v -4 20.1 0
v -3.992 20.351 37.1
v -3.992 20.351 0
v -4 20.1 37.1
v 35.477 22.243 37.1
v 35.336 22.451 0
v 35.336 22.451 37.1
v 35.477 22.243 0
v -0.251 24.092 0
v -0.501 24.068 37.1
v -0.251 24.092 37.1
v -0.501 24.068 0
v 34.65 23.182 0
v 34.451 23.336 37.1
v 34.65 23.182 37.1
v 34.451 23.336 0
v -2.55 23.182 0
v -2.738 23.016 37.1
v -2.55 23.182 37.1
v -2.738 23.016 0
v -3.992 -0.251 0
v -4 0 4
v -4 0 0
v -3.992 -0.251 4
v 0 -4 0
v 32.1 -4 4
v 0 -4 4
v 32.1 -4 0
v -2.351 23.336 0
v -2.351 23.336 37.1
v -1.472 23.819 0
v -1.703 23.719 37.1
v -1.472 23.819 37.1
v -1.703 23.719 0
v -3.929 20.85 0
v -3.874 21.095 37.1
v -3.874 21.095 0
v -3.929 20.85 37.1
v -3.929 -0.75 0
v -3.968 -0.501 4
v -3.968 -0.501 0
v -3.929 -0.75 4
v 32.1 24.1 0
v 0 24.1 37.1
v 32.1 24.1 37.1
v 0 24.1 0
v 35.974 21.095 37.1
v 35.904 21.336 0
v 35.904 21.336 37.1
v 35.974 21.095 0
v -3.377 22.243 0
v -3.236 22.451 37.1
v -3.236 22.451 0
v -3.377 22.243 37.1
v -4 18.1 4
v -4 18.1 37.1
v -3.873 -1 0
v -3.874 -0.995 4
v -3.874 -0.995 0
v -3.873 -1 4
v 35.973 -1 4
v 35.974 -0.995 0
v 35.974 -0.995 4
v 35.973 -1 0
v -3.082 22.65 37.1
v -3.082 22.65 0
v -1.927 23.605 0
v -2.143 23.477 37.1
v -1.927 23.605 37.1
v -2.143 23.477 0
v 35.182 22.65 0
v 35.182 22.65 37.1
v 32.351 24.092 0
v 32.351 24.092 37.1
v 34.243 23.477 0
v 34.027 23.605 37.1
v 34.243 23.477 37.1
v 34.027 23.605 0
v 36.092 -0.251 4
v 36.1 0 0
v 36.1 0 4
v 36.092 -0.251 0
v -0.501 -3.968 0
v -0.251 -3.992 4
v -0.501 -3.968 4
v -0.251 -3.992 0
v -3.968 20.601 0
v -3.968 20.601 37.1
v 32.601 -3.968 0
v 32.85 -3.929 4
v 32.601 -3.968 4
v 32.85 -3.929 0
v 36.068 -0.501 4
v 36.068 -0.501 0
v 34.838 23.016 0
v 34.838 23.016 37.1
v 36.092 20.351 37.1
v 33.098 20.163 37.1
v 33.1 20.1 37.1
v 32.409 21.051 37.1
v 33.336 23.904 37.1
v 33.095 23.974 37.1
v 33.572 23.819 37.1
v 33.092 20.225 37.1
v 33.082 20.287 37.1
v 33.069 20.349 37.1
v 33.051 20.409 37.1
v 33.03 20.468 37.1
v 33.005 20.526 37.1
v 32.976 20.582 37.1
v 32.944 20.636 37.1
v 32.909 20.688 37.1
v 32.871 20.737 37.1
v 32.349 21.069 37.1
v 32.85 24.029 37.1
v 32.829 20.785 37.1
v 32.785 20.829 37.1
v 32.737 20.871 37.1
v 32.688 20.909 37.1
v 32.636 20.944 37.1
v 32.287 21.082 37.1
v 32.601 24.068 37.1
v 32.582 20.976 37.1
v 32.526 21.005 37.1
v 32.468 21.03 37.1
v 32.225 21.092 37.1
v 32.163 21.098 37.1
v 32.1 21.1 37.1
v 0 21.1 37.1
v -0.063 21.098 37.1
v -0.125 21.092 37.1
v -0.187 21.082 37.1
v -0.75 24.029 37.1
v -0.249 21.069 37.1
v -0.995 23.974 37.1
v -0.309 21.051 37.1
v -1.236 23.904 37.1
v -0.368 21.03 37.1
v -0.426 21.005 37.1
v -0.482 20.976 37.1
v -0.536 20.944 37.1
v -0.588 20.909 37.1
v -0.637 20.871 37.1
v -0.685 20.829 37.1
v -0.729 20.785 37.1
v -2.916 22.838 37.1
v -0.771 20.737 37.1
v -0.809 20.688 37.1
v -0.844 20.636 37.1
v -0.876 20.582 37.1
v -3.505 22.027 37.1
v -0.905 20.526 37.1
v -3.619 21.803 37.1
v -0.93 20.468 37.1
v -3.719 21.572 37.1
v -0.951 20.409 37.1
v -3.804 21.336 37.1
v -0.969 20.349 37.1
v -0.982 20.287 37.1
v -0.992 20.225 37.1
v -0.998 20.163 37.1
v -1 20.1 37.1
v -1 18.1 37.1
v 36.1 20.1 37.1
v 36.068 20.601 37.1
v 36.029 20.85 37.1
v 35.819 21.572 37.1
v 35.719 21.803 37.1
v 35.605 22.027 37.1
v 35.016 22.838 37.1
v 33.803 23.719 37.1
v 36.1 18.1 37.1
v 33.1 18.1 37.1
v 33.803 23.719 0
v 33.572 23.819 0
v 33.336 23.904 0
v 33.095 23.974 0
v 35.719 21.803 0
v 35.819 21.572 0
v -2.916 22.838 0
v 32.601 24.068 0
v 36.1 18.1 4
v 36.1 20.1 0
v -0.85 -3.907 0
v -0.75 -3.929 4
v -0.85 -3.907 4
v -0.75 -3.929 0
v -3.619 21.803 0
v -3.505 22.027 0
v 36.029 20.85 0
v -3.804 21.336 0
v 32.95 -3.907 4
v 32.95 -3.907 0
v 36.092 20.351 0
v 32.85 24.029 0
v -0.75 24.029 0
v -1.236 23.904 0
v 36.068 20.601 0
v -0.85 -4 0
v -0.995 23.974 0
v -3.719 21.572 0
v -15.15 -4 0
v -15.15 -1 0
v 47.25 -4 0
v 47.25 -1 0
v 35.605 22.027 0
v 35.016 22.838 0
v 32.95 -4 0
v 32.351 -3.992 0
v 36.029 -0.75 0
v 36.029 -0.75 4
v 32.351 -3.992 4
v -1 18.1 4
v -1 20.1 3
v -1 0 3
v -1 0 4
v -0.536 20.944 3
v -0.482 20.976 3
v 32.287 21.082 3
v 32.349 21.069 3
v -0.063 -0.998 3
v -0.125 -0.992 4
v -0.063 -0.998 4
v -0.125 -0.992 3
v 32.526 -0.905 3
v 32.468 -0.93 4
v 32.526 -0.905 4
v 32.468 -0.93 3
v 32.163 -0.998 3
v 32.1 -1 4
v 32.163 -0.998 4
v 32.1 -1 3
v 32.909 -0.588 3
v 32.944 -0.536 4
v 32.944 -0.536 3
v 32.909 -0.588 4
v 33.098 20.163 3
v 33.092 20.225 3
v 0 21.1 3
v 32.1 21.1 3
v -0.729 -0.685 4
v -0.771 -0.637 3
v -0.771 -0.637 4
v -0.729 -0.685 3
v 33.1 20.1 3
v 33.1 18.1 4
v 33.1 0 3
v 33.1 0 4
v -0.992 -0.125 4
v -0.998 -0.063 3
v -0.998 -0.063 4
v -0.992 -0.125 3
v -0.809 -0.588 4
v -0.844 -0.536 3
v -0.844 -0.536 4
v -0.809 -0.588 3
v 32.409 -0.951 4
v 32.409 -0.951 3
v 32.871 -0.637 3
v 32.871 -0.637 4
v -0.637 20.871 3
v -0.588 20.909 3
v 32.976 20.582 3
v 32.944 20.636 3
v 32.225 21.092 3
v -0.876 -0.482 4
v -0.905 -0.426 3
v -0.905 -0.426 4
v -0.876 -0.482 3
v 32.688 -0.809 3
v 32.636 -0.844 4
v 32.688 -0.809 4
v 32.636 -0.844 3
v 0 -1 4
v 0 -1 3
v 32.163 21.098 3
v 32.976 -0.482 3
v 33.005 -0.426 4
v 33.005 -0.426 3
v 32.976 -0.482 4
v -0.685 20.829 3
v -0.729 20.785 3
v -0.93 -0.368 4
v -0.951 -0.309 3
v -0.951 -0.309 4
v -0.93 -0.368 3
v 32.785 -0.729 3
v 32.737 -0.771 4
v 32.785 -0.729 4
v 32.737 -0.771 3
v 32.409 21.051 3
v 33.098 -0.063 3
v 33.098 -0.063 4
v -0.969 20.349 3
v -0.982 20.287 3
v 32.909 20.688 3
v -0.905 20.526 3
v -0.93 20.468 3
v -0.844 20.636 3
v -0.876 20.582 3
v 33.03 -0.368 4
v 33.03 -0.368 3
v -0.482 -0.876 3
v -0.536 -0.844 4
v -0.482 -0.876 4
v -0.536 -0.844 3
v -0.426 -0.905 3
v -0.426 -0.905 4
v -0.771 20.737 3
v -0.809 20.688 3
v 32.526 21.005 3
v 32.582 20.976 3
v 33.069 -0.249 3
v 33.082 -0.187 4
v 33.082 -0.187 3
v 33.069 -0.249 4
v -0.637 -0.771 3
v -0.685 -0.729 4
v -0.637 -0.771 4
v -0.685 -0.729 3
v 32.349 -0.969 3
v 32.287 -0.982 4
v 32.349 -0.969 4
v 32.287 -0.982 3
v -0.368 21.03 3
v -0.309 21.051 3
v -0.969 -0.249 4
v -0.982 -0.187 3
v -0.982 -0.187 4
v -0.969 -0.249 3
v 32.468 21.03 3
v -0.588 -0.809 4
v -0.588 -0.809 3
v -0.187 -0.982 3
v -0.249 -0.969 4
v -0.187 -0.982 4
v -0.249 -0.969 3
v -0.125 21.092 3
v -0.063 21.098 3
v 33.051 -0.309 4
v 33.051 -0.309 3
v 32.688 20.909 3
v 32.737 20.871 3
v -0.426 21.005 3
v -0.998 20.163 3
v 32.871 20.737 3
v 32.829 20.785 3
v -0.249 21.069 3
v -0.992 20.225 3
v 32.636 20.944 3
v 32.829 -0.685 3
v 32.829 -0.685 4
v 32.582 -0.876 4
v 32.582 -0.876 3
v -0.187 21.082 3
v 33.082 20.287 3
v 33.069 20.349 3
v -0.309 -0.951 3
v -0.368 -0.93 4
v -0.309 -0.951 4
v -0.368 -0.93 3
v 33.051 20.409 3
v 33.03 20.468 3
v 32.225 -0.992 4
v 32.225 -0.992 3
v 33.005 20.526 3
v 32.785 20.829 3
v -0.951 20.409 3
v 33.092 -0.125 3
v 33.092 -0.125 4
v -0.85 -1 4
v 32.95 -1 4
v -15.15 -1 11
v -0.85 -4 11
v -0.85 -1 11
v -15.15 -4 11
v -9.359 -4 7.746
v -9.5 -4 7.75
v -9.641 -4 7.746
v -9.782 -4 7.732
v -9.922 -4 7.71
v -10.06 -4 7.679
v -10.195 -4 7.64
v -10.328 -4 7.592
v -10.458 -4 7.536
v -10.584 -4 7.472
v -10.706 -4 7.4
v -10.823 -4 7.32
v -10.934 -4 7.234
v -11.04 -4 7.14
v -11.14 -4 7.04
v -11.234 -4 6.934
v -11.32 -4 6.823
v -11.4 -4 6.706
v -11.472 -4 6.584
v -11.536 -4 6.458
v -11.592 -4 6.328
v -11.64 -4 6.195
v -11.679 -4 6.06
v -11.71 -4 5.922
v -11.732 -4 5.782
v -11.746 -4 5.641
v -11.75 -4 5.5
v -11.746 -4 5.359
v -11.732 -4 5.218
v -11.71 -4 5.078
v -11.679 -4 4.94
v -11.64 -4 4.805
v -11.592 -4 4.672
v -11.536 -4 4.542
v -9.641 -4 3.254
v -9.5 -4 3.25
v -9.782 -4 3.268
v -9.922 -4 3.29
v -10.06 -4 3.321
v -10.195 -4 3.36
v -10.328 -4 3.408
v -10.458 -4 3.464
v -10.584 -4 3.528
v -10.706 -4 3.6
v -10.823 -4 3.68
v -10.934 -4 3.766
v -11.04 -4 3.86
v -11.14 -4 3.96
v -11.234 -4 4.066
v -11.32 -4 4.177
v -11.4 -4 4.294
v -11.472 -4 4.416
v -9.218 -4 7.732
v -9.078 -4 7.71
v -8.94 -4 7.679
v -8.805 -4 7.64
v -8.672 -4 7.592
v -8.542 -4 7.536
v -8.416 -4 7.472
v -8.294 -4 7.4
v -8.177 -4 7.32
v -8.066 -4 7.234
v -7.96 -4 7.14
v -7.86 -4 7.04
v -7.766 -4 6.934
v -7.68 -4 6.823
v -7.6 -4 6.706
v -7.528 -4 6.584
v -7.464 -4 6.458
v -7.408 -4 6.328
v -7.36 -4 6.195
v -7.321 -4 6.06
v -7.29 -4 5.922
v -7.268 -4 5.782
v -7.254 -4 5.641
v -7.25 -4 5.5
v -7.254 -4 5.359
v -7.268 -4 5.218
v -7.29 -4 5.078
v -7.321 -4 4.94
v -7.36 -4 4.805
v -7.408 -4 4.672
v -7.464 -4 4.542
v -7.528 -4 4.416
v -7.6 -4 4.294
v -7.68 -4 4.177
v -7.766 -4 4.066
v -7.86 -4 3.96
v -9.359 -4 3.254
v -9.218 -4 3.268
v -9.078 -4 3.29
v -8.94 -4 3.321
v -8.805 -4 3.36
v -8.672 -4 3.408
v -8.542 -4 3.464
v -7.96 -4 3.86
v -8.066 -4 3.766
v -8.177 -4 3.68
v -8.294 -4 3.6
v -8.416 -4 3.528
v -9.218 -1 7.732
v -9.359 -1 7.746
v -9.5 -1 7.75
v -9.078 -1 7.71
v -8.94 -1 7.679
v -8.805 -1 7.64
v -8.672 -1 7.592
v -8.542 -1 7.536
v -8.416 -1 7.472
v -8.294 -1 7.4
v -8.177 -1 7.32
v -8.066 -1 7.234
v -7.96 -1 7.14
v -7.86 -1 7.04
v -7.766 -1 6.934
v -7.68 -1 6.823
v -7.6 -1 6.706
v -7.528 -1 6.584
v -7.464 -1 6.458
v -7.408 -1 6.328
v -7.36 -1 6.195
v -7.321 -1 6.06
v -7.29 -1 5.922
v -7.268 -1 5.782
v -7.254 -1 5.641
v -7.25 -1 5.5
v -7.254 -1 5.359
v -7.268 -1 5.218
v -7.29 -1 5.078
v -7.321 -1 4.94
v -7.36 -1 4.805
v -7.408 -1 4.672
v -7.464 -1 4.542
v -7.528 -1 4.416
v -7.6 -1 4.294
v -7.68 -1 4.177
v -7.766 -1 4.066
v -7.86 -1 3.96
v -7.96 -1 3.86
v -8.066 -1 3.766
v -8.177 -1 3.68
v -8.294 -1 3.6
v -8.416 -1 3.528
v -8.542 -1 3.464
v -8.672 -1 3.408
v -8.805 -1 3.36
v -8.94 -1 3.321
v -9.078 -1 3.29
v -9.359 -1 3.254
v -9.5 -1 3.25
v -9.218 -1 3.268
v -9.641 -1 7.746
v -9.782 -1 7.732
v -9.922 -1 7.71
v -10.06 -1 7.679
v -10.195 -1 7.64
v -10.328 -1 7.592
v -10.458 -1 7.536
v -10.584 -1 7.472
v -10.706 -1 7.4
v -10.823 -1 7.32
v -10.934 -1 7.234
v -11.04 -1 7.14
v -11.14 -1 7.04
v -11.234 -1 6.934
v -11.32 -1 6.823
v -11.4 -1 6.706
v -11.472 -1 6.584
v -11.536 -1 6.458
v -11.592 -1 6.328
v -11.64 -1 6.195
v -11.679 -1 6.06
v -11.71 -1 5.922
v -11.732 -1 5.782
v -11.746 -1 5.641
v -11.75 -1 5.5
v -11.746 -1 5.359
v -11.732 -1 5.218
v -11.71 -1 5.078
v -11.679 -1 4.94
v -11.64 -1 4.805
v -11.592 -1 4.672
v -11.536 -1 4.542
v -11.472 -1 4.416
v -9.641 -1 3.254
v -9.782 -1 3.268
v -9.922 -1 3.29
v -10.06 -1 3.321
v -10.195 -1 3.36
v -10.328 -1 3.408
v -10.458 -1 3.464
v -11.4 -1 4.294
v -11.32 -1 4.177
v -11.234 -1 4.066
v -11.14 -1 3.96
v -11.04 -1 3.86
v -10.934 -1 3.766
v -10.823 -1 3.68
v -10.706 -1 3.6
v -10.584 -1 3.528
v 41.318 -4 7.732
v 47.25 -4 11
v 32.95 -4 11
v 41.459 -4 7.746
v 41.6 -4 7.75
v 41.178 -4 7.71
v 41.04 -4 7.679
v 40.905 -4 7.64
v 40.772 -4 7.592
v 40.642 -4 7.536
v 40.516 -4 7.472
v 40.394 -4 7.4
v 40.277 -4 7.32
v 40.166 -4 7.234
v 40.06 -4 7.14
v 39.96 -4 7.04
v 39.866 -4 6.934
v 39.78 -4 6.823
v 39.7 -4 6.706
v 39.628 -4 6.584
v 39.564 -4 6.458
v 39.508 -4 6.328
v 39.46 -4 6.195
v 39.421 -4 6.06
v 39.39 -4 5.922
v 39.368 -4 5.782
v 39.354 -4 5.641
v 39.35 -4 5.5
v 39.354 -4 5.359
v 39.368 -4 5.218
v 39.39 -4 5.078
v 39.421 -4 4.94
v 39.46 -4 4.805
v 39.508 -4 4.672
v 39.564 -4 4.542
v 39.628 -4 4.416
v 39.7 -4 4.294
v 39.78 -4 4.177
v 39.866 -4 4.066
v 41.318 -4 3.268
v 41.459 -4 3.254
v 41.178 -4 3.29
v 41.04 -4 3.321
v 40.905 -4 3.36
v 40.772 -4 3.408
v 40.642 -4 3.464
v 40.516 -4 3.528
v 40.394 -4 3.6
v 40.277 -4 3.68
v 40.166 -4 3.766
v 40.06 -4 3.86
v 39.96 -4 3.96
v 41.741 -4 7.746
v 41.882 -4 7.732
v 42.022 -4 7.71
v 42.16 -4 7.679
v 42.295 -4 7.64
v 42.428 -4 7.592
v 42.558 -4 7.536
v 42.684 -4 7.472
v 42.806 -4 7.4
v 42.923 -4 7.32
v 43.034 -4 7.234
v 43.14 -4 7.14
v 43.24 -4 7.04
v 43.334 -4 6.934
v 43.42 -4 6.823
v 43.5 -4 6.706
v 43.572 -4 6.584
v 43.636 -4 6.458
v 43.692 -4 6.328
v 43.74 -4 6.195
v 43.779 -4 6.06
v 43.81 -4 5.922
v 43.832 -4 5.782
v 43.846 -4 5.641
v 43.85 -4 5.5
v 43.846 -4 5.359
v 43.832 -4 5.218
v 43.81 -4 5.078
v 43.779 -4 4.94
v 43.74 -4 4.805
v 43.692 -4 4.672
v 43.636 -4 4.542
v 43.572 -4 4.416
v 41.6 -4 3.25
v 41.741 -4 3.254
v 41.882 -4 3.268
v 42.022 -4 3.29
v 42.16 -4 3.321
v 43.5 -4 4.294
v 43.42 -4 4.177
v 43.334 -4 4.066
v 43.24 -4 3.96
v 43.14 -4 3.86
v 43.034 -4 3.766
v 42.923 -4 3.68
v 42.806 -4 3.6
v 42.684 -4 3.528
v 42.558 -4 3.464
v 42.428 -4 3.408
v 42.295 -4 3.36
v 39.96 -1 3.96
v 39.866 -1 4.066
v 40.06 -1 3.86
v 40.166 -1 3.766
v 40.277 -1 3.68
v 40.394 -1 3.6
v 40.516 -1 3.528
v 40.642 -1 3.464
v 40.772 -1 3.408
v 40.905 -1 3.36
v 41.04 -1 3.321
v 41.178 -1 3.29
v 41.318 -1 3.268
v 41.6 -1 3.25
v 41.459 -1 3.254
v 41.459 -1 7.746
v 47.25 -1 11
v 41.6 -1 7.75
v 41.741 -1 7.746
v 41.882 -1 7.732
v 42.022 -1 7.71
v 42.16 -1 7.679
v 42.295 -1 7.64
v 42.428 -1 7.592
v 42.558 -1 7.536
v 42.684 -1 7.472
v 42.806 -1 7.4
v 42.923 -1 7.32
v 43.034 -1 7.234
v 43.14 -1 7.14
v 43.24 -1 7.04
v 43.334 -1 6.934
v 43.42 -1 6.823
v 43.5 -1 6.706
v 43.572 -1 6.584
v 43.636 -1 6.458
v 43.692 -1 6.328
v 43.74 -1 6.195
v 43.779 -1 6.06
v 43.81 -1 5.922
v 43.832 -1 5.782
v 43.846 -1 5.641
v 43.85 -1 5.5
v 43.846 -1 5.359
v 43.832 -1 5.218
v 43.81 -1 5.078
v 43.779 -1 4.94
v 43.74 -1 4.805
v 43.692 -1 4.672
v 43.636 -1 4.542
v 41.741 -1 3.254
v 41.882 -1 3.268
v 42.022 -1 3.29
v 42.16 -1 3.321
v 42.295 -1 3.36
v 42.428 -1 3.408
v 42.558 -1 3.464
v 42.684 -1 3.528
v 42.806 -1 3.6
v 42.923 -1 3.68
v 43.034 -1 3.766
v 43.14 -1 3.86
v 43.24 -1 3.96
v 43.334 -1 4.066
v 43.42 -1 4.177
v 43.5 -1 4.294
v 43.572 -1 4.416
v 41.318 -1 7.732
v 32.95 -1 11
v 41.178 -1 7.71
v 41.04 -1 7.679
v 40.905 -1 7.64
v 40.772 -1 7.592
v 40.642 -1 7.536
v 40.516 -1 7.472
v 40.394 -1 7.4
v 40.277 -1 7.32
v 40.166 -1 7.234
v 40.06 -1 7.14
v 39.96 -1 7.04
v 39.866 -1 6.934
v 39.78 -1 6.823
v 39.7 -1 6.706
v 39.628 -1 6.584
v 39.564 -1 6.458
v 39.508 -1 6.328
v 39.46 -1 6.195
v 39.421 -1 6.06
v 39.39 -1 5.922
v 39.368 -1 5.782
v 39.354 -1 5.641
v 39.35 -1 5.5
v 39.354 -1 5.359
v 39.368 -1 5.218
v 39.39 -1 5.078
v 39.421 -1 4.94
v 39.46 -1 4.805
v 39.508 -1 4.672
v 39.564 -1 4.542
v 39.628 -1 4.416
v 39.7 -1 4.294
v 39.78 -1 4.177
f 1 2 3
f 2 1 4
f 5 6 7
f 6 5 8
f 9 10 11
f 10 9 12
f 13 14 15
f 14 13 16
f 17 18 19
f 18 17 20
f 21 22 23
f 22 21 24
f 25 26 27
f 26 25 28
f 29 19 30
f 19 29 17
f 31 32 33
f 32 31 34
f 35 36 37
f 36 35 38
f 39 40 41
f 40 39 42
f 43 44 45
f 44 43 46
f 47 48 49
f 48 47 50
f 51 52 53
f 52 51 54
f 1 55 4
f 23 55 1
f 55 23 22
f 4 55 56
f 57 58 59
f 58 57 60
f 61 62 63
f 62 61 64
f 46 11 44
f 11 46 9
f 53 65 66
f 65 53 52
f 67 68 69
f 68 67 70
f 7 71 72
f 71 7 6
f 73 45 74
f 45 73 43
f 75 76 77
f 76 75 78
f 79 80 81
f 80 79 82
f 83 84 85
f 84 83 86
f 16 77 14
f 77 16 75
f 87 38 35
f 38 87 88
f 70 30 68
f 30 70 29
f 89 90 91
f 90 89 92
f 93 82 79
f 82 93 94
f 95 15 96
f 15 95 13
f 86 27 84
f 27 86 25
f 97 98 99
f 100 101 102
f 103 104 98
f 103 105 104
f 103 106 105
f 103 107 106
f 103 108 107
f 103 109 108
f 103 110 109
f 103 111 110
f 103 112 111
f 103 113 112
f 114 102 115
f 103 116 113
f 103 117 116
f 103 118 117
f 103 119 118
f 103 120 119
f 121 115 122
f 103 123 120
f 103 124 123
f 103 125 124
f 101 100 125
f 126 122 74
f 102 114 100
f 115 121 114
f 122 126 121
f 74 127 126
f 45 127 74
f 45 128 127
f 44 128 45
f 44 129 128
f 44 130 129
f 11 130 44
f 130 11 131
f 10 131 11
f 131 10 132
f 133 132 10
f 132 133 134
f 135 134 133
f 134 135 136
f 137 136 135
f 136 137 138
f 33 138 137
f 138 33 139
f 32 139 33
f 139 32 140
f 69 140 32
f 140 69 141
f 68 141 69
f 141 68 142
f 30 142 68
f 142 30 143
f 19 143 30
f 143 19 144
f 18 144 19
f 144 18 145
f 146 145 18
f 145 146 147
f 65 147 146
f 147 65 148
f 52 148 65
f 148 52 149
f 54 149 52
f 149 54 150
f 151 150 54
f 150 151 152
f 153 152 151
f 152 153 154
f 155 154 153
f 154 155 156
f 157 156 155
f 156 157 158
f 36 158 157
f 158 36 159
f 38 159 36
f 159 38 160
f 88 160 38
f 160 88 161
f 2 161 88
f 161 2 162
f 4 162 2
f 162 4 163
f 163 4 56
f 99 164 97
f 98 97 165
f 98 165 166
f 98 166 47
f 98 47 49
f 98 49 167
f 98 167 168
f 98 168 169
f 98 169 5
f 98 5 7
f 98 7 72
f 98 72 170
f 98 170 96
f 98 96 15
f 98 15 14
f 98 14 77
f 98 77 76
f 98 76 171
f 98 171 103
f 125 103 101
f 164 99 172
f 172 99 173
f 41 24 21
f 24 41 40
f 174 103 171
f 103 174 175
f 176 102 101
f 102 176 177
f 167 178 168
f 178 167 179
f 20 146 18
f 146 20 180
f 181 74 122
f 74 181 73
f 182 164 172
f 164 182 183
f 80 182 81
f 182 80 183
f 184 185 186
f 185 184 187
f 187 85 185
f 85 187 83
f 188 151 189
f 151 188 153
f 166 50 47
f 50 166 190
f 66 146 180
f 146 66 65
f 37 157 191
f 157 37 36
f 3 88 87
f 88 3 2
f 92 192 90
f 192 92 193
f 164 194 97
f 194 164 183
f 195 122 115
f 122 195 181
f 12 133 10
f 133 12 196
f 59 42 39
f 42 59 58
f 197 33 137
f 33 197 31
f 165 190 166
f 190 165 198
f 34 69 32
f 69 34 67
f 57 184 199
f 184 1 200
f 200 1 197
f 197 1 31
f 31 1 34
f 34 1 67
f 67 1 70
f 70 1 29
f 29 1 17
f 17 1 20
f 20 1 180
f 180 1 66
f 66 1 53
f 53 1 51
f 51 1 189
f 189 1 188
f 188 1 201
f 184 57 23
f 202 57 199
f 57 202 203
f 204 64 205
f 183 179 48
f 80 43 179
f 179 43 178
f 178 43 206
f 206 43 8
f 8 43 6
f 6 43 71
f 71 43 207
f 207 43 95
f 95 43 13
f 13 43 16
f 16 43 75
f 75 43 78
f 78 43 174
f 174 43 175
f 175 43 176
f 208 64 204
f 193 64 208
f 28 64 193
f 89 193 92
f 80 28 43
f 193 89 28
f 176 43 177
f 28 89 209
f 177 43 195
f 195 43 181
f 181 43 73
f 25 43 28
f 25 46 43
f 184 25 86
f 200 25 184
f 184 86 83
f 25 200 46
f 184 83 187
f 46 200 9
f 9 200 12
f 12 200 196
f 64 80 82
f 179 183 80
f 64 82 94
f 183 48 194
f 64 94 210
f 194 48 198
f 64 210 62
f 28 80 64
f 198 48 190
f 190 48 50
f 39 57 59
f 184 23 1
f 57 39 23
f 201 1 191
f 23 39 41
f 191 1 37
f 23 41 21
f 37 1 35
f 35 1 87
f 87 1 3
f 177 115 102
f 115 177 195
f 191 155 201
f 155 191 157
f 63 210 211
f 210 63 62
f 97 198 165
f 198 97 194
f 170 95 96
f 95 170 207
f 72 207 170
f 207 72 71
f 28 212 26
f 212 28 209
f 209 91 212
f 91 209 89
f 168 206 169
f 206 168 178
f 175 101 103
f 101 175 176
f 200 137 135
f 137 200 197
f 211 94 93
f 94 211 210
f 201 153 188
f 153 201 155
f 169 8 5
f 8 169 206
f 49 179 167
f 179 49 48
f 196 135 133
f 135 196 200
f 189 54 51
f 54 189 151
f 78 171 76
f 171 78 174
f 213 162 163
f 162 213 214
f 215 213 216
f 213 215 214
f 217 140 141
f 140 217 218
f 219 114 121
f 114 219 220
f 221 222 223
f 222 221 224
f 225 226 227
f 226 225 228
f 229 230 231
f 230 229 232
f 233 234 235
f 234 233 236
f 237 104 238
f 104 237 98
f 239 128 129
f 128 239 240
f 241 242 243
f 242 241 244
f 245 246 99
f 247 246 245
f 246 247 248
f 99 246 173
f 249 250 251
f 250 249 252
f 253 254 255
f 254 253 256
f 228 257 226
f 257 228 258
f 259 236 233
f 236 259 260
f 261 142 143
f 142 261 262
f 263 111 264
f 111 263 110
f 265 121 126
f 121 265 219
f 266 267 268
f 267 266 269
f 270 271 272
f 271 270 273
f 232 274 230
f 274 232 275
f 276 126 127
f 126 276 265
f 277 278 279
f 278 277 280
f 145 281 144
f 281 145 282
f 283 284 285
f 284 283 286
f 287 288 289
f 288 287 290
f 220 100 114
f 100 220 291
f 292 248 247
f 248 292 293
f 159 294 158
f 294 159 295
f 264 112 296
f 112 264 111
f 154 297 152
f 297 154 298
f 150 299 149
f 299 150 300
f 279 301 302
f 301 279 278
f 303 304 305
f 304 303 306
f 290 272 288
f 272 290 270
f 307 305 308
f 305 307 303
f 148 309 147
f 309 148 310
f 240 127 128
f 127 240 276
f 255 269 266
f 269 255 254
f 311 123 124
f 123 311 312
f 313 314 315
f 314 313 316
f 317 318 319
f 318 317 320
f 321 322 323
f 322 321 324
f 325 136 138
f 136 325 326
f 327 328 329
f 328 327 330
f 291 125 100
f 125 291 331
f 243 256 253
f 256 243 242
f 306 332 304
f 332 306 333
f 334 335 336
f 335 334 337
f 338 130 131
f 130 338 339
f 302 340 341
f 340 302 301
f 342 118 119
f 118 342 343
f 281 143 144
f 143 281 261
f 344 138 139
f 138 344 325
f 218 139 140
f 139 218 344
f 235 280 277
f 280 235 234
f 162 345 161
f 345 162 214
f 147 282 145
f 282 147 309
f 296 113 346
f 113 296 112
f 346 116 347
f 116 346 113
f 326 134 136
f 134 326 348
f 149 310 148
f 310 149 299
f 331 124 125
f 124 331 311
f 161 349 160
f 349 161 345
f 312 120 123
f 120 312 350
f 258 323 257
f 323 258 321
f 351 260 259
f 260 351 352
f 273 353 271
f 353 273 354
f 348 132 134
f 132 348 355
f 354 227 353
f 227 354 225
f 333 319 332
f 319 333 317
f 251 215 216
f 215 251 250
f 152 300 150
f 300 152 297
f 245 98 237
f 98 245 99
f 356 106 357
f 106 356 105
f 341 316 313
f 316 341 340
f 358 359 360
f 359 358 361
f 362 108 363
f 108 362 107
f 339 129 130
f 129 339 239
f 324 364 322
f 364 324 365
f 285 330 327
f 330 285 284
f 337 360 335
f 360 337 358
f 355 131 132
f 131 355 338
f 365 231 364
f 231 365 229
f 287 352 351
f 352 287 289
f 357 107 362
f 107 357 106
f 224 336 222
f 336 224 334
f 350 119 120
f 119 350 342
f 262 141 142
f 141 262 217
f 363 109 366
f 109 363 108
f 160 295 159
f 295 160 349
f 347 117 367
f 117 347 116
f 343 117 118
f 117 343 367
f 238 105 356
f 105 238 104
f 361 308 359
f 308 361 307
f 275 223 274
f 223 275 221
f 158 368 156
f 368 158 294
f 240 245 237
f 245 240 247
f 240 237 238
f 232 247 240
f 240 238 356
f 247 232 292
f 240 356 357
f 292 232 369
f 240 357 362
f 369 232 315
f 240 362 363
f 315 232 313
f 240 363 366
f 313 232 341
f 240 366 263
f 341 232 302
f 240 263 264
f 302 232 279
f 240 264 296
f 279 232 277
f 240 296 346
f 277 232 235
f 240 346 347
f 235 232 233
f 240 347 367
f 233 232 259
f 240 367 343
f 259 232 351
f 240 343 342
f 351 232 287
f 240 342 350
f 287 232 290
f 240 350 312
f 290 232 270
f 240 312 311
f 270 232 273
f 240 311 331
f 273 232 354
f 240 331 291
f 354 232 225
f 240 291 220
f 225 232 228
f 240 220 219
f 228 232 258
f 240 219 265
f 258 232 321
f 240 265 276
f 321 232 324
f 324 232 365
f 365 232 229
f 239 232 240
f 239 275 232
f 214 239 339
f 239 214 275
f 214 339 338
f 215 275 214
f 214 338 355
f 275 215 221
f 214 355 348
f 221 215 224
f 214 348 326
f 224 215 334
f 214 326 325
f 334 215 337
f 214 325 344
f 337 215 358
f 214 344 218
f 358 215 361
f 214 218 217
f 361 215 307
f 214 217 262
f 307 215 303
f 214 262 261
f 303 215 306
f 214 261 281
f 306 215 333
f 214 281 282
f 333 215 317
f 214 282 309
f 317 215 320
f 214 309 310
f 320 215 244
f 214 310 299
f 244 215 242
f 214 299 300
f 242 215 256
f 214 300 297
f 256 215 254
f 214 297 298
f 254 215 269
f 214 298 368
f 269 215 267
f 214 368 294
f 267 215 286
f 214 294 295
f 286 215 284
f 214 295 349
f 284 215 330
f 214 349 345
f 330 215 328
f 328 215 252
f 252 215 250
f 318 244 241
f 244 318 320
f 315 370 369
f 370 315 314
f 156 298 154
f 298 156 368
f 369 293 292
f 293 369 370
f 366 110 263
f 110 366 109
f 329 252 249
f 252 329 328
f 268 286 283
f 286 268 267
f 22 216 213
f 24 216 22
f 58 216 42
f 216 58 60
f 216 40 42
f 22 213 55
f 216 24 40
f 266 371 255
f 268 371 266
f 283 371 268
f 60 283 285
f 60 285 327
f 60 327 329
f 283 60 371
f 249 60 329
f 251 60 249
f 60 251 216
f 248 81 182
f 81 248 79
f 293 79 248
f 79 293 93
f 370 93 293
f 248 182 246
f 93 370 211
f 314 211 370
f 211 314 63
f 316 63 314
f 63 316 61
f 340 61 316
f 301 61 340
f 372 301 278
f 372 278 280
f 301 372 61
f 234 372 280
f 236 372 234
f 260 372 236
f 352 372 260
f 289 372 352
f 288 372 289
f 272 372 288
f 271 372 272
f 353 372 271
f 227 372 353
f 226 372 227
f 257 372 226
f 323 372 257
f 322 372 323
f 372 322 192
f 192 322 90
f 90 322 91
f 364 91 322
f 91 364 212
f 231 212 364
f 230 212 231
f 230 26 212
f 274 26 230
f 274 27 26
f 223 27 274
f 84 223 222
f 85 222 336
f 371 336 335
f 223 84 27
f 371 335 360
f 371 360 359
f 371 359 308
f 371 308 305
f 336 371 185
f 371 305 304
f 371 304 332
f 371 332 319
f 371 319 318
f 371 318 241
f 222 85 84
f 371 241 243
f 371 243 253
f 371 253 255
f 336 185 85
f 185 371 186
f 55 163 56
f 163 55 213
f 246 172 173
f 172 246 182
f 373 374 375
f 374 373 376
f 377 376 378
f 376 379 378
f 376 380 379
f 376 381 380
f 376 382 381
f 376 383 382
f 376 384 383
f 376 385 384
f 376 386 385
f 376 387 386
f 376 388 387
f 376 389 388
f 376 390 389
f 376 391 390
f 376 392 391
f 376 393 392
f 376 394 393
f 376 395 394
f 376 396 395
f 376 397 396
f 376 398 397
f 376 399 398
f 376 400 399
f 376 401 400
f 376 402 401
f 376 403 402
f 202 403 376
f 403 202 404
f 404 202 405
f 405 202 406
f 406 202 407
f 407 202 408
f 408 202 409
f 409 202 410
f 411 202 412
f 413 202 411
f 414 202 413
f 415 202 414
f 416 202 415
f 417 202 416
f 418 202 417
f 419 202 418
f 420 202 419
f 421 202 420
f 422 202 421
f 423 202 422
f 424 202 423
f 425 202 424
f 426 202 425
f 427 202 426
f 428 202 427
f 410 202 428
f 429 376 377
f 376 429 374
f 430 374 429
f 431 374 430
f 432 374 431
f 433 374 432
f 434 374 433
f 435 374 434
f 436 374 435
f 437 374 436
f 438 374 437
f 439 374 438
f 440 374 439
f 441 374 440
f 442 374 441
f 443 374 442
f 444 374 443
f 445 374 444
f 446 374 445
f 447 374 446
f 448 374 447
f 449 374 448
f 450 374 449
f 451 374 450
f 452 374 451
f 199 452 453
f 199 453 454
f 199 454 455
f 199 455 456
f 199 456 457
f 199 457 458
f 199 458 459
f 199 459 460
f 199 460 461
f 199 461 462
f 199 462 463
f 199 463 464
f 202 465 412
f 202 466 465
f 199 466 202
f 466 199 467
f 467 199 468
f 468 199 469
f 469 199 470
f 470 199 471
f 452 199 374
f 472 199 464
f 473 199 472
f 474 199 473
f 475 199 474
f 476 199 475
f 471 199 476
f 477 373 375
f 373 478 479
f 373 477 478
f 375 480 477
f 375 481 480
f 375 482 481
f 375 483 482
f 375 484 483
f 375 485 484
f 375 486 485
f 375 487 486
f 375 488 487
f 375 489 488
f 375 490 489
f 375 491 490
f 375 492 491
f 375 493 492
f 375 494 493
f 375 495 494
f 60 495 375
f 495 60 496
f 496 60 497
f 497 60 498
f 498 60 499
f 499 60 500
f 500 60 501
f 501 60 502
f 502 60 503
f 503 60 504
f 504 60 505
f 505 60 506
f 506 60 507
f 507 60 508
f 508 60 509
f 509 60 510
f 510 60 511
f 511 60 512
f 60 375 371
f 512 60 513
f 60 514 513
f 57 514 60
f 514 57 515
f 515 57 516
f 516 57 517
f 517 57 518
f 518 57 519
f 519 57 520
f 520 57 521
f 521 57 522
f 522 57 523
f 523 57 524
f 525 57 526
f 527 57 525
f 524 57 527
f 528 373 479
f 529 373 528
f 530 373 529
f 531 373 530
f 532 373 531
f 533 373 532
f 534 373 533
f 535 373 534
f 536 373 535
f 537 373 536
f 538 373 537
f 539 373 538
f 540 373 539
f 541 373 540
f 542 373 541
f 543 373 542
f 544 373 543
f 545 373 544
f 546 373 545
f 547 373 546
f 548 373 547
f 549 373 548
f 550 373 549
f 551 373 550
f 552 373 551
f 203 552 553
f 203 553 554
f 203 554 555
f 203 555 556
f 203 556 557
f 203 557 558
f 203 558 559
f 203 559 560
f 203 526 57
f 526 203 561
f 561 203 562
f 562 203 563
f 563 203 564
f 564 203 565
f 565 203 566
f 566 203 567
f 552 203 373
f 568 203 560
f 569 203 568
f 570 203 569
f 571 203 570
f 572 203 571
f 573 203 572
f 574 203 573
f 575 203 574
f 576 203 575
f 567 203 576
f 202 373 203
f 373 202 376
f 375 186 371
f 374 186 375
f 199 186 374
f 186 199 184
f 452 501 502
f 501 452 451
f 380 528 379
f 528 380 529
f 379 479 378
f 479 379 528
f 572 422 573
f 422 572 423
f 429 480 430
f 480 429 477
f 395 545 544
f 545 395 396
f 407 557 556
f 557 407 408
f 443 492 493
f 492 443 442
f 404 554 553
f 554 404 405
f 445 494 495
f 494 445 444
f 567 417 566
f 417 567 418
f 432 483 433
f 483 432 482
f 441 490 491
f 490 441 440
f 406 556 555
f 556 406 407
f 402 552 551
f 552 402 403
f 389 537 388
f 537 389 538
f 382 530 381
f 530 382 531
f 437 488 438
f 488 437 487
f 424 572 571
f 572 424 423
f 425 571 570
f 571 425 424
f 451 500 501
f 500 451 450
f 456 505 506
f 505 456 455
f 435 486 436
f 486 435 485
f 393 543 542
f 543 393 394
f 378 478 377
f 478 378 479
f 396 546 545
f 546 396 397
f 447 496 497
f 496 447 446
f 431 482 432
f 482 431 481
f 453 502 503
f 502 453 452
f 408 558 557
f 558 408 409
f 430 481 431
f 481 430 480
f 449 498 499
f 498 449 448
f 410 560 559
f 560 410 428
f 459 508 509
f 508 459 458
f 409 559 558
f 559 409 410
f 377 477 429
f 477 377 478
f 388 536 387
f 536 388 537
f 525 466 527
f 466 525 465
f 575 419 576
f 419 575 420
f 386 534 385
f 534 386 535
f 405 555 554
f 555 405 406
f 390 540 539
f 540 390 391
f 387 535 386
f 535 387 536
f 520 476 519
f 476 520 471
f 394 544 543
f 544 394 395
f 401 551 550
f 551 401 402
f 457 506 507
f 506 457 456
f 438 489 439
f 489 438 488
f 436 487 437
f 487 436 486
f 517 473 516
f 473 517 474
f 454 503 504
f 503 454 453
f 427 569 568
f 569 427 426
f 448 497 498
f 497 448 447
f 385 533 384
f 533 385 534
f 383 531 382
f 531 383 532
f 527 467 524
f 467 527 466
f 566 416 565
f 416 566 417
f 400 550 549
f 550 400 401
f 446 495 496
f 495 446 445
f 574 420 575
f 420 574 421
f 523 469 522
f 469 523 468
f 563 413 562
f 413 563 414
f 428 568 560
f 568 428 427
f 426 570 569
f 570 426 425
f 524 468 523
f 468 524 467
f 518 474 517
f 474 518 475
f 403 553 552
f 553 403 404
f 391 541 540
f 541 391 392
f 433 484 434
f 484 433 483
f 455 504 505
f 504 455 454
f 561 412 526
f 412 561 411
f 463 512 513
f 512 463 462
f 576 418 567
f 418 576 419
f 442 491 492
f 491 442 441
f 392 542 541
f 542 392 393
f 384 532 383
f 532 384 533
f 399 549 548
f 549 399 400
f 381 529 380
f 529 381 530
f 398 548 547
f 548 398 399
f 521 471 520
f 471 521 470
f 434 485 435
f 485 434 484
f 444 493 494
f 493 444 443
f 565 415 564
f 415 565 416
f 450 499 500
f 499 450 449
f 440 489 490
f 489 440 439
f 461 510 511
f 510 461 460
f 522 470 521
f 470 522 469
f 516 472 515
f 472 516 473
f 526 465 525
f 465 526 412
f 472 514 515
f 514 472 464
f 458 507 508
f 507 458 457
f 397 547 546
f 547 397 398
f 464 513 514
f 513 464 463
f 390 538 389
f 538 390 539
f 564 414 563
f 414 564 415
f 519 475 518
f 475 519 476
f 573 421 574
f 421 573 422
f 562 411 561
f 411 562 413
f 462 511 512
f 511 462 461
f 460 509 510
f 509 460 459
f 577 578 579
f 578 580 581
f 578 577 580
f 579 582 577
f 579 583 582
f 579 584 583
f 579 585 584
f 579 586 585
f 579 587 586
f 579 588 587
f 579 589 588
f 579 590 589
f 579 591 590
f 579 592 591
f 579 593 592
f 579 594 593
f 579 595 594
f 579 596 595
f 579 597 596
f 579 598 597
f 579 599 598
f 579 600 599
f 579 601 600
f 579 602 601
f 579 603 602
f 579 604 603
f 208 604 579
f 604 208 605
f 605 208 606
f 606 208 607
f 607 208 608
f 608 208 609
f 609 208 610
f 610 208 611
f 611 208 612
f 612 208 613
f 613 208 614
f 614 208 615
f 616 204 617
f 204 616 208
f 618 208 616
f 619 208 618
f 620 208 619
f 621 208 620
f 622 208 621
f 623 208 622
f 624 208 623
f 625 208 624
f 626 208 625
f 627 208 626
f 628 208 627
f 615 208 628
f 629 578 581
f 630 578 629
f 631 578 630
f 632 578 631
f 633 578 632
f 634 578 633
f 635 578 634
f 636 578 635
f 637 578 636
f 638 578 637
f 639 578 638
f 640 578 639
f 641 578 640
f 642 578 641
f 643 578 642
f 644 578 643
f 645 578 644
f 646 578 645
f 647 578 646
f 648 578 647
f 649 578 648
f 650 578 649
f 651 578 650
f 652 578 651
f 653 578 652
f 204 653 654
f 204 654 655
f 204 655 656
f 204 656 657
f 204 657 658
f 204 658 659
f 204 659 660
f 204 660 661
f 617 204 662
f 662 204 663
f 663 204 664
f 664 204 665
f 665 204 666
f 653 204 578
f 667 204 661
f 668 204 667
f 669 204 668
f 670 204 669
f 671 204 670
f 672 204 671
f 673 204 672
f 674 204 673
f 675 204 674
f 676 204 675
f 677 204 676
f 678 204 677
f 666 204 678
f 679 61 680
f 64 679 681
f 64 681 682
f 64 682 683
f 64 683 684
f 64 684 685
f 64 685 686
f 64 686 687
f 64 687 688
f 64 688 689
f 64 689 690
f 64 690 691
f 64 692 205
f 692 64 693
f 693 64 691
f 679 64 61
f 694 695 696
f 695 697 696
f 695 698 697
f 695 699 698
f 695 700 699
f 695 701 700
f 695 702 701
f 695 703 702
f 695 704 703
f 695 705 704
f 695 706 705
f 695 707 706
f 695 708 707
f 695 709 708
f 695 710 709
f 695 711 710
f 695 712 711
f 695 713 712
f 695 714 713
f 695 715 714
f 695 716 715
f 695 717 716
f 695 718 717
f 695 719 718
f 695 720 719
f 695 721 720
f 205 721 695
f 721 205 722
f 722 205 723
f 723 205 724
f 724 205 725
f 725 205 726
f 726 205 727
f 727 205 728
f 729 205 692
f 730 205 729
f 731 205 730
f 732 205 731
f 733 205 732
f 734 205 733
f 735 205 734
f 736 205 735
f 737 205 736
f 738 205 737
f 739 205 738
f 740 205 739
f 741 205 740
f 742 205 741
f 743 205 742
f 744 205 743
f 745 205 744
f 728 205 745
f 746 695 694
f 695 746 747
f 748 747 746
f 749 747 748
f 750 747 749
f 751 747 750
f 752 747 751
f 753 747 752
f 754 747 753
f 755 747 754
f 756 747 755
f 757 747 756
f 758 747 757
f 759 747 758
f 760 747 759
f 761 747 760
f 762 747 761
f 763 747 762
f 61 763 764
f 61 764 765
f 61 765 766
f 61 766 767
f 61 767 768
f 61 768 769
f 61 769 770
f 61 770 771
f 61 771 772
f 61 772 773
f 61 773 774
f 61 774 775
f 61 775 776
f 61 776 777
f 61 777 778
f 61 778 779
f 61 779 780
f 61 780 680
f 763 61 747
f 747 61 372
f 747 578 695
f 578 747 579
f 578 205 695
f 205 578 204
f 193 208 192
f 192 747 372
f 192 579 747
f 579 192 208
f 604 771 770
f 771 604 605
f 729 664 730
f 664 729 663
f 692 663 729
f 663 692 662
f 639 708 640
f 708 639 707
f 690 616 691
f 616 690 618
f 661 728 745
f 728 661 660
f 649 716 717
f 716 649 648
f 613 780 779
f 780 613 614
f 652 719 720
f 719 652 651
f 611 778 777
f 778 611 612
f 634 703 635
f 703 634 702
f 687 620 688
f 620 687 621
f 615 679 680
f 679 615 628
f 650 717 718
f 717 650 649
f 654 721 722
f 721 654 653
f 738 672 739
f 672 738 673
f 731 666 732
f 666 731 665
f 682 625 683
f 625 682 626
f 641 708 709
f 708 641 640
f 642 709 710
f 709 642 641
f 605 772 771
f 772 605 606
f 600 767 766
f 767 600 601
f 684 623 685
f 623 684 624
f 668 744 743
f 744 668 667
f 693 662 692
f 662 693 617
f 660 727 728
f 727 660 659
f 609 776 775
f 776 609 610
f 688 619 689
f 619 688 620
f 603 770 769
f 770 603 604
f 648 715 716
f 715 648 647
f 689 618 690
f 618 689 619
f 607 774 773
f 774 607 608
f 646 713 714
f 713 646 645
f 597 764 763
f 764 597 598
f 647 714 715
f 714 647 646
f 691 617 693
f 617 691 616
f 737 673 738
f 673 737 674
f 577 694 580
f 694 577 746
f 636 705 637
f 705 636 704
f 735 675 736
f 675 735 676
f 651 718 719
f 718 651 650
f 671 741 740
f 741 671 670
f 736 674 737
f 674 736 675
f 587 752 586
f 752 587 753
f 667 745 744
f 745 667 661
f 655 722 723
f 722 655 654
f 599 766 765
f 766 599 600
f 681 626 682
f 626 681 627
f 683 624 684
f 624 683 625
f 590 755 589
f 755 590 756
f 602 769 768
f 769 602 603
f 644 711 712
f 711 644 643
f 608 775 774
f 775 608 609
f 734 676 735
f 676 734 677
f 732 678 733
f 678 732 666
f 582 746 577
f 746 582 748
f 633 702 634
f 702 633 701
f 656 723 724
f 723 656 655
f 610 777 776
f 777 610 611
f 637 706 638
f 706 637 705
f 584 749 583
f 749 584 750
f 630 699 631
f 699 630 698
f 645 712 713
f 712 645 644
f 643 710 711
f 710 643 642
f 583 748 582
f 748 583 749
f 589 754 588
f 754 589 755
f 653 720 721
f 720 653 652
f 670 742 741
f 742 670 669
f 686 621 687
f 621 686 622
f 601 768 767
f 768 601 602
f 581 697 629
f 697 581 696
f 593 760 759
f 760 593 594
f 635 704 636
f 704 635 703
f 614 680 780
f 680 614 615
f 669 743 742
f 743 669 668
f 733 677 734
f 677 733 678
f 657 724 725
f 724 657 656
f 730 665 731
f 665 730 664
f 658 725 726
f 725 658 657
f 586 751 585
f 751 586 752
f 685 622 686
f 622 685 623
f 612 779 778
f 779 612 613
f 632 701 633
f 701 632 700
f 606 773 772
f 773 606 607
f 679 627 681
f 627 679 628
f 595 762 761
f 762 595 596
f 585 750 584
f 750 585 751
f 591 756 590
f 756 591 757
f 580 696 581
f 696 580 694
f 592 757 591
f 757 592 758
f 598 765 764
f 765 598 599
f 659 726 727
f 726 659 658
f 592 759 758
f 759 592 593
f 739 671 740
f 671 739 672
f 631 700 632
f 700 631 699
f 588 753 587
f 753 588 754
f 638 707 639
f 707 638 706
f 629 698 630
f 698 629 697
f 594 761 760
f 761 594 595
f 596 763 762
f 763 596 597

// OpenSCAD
// Side enclosure for motion sensor and SD card reader
//34567891123456789212345678931234567894123456789512345678961234567897123456789

// Global settings
$fn = 100;
FUDGE = 0.01; // To ensure non-perfect difference edges

// Specs, measured
width = 20.0;
boardLength = 32.0;
boardHeight = 11.0; // bottom of diffuser dome to top of caps/jumper

// Options
tol = .1; // room to make sure things fit
// Box options
botRoom = 1.0; // bottom air gap
wallThickness = 3.0;
cornerR = 4.0; // radius for rounding box corners
hasFeet = true;
footD = 11.0;
footHD = 4.5; // Foot hole diameter
footRelief = 0.0;

module RoundedBox(l, w, h, t, r) {
    // Rounded box with open top
    difference() {
        hull() {
            cylinder(h=h, r=r, center=false);
            translate([0,w,0])
                cylinder(h=h, r=r, center=false);
            translate([l,w,0])
                cylinder(h=h, r=r, center=false);
            translate([l,0,0])
                cylinder(h=h, r=r, center=false);
        }
        hull() {
            translate([0,0,t])
                cylinder(h=h, r=r-t, center=false);
            translate([0,w,t])
                cylinder(h=h, r=r-t, center=false);
            translate([l,w,t])
                cylinder(h=h, r=r-t, center=false);
            translate([l,0,t])
                cylinder(h=h, r=r-t, center=false);
        }
    }
}

module AttachFoot(d, hd, h=wallThickness) {
    difference() {
        translate([0,-h/2,h/2])
            cube([d,d*1.3,h], center=true);
        translate([0,0,-FUDGE/2])
            cylinder(h=h+FUDGE, d=hd);
    }
}

          
boxHeight = boardHeight+2*wallThickness+width+tol;
boxWidth = width+tol; // to cylinder centers (-2*r)
boxLength = boardLength+tol;

union() {
    difference() {
        RoundedBox(l=boxLength, w=boxWidth, h=boxHeight,
                t=wallThickness, r=cornerR);
        translate([boxLength/2,-cornerR/2,boxHeight+cornerR])
            cube([boxLength*2,boxWidth*2,boxHeight*2], center=true);
    }
    // screw hole feet
    translate([-(footD/2+cornerR),
            -cornerR+wallThickness,
            footD/2])
        rotate([0,-90,90])
            AttachFoot(d=footD, hd=footHD);
    translate([boxLength+(footD/2+cornerR),
            -cornerR+wallThickness,
            footD/2])
        rotate([0,90,-90])
            AttachFoot(d=footD, hd=footHD);
}
